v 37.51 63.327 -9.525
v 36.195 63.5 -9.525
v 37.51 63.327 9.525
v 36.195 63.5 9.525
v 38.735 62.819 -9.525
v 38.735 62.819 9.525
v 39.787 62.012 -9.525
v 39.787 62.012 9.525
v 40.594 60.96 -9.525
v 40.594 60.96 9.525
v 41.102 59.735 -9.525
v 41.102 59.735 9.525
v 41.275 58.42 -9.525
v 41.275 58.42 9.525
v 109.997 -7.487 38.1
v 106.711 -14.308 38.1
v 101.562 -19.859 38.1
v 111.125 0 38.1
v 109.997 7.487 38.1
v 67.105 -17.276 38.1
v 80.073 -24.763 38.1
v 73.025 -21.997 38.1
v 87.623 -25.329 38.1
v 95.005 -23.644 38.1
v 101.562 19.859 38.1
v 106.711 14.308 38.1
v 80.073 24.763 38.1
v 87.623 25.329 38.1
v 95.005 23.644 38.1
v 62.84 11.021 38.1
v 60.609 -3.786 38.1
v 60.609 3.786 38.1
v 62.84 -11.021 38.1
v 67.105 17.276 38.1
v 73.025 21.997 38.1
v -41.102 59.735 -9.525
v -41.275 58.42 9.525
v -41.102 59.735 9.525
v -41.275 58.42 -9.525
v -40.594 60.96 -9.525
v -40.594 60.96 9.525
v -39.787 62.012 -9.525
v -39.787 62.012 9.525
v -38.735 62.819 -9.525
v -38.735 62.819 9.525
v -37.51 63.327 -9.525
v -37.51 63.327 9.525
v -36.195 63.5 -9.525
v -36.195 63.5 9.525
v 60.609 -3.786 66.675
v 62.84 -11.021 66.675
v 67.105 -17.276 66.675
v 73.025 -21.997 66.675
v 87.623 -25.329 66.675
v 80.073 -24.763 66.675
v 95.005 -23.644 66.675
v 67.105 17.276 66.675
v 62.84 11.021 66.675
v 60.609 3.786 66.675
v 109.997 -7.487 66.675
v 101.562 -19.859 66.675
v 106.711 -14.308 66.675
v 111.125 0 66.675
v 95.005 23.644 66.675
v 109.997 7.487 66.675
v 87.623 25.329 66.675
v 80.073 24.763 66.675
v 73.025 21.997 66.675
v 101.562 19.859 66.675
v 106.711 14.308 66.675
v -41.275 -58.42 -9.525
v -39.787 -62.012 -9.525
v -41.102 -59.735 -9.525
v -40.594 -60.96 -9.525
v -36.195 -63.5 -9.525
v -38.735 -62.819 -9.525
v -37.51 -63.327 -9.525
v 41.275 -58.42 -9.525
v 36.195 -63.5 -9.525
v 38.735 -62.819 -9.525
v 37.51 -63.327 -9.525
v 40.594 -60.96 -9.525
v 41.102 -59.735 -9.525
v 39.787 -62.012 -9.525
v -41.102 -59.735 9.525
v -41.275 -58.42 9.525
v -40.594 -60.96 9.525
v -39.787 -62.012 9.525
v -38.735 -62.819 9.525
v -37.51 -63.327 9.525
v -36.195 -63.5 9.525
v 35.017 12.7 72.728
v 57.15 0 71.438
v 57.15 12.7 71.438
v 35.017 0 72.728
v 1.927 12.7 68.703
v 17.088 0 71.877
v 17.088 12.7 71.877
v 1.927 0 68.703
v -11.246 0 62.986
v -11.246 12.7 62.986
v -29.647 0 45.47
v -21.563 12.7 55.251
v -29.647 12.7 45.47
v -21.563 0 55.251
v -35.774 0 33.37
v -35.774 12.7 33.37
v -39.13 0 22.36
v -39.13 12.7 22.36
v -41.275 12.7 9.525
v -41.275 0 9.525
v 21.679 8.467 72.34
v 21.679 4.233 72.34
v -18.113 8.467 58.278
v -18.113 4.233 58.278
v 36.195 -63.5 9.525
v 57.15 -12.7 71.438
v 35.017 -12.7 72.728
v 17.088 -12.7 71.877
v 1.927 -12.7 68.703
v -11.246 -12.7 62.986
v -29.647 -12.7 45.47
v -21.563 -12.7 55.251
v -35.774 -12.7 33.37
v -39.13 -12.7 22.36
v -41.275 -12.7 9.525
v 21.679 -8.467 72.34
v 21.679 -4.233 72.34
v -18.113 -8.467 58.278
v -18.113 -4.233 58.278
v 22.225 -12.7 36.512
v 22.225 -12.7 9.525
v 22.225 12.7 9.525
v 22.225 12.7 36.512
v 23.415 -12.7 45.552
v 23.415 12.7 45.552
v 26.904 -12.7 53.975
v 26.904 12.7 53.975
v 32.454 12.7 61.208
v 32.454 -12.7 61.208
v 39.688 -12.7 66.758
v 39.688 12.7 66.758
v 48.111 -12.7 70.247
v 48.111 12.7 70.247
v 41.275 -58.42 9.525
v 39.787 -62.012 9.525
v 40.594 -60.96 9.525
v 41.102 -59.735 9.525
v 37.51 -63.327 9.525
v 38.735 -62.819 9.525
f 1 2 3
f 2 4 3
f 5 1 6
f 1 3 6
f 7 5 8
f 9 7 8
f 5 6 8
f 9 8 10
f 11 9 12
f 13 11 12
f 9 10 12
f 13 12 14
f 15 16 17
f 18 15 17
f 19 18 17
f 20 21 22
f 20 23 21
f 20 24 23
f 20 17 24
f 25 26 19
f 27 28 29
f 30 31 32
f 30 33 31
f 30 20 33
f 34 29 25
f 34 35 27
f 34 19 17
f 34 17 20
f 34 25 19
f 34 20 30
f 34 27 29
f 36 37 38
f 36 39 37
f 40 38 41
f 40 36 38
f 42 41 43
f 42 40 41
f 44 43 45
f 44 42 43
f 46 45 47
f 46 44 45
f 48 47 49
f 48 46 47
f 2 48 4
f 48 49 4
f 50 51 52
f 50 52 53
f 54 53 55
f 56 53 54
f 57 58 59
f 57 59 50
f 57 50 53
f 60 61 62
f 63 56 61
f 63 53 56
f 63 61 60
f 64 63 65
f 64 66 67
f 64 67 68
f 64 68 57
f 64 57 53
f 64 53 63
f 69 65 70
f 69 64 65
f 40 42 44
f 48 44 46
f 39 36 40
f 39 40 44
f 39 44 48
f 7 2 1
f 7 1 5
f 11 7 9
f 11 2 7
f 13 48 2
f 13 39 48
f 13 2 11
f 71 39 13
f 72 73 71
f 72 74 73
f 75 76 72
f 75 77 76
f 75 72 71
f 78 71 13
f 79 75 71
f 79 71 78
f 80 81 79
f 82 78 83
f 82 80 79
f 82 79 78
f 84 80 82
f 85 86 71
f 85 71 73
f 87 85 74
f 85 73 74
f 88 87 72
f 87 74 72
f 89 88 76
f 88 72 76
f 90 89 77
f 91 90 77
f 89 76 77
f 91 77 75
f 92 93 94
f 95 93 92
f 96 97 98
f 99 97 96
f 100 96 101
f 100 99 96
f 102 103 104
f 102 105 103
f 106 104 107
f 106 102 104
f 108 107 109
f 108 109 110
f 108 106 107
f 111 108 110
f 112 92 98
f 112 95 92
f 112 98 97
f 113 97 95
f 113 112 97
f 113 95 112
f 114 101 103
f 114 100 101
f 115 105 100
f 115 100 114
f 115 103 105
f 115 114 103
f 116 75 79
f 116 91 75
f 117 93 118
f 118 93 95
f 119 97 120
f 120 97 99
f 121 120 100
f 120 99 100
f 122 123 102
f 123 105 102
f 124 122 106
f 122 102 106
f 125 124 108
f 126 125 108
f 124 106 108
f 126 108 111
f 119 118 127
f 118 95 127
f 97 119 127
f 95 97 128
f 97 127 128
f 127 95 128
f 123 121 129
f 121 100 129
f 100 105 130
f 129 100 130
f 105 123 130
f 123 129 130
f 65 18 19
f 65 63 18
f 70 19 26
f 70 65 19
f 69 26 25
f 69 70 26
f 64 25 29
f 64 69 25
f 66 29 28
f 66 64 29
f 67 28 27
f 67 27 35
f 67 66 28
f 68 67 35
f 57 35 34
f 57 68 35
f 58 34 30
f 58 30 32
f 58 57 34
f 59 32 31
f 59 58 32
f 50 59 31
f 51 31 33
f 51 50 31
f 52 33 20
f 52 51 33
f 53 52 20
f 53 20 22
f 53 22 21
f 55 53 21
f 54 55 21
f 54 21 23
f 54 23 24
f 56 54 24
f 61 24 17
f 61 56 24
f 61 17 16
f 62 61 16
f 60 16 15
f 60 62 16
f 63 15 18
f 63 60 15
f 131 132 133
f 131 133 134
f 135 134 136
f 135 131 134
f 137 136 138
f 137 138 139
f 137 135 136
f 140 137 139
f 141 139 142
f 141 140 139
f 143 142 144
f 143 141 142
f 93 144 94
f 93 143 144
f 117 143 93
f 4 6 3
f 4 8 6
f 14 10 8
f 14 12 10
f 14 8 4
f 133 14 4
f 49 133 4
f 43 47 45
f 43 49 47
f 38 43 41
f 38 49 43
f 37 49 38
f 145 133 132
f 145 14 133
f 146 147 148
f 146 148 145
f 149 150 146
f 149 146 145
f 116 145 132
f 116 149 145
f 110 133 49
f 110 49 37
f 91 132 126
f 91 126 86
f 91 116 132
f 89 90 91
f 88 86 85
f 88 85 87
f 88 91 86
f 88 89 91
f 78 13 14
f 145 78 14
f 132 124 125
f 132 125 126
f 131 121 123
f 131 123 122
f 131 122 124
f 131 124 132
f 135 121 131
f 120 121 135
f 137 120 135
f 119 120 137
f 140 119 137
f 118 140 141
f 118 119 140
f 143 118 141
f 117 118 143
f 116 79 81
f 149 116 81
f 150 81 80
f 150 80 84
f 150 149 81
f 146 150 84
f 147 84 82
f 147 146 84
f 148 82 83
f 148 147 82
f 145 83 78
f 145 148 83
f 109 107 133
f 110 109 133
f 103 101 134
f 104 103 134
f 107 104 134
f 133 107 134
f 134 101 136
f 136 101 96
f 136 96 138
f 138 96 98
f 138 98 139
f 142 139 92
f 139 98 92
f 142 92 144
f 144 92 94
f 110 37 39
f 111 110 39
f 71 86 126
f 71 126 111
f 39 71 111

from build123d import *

# Parameters (mm, degrees)
F1_DEPTH = 63.5
F2_DEPTH = 12.7
F4_R     = 5.08


with BuildPart() as f1:
    # F0 (on Front) → F1 (new body, symmetric)
    with BuildSketch(Plane.XZ):
        Polygon((22.225, 9.525), (-41.275, 9.525), (-41.275, -9.525), (41.275, -9.525), (41.275, 9.525), align=None)
    extrude(amount=F1_DEPTH, both=True)

    # F0 (on Front) → F2 (join, symmetric)
    with BuildSketch(Plane.XZ):
        with BuildLine():
            add(Edge.make_bspline(
                [(57.15, 71.4375), (30.822843, 73.24753), (-33.411026, 82.19815), (-41.275, 9.525)],
                knots=[0, 0, 0, 0, 116.278279, 116.278279, 116.278279, 116.278279], degree=3))
            Line((-41.275, 9.525), (22.225, 9.525))
            Line((22.225, 9.525), (22.225, 36.5125))
            ThreePointArc((22.225, 36.5125), (32.454296, 61.208204), (57.15, 71.4375))
        make_face()
    extrude(amount=F2_DEPTH, both=True)

    # F4
    f4_edges = [f1.edges().sort_by_distance(p)[0] for p in [
        (41.275, 63.5, 0),
        (41.275, -63.5, 0),
        (-41.275, -63.5, 0),
        (-41.275, 63.5, 0),
    ]]
    fillet(f4_edges, radius=F4_R)


with BuildPart() as f3:
    # F0 (on Front) → F3 (revolve)
    with BuildSketch(Plane.XZ):
        Polygon((111.125, 66.675), (85.725, 66.675), (85.725, 52.3875), (85.725, 38.1), (111.125, 38.1), align=None)
    revolve(axis=Axis((85.725, 0, 54.76875), (0, 0, 1)))


solid = Compound([f1.part, f3.part])
